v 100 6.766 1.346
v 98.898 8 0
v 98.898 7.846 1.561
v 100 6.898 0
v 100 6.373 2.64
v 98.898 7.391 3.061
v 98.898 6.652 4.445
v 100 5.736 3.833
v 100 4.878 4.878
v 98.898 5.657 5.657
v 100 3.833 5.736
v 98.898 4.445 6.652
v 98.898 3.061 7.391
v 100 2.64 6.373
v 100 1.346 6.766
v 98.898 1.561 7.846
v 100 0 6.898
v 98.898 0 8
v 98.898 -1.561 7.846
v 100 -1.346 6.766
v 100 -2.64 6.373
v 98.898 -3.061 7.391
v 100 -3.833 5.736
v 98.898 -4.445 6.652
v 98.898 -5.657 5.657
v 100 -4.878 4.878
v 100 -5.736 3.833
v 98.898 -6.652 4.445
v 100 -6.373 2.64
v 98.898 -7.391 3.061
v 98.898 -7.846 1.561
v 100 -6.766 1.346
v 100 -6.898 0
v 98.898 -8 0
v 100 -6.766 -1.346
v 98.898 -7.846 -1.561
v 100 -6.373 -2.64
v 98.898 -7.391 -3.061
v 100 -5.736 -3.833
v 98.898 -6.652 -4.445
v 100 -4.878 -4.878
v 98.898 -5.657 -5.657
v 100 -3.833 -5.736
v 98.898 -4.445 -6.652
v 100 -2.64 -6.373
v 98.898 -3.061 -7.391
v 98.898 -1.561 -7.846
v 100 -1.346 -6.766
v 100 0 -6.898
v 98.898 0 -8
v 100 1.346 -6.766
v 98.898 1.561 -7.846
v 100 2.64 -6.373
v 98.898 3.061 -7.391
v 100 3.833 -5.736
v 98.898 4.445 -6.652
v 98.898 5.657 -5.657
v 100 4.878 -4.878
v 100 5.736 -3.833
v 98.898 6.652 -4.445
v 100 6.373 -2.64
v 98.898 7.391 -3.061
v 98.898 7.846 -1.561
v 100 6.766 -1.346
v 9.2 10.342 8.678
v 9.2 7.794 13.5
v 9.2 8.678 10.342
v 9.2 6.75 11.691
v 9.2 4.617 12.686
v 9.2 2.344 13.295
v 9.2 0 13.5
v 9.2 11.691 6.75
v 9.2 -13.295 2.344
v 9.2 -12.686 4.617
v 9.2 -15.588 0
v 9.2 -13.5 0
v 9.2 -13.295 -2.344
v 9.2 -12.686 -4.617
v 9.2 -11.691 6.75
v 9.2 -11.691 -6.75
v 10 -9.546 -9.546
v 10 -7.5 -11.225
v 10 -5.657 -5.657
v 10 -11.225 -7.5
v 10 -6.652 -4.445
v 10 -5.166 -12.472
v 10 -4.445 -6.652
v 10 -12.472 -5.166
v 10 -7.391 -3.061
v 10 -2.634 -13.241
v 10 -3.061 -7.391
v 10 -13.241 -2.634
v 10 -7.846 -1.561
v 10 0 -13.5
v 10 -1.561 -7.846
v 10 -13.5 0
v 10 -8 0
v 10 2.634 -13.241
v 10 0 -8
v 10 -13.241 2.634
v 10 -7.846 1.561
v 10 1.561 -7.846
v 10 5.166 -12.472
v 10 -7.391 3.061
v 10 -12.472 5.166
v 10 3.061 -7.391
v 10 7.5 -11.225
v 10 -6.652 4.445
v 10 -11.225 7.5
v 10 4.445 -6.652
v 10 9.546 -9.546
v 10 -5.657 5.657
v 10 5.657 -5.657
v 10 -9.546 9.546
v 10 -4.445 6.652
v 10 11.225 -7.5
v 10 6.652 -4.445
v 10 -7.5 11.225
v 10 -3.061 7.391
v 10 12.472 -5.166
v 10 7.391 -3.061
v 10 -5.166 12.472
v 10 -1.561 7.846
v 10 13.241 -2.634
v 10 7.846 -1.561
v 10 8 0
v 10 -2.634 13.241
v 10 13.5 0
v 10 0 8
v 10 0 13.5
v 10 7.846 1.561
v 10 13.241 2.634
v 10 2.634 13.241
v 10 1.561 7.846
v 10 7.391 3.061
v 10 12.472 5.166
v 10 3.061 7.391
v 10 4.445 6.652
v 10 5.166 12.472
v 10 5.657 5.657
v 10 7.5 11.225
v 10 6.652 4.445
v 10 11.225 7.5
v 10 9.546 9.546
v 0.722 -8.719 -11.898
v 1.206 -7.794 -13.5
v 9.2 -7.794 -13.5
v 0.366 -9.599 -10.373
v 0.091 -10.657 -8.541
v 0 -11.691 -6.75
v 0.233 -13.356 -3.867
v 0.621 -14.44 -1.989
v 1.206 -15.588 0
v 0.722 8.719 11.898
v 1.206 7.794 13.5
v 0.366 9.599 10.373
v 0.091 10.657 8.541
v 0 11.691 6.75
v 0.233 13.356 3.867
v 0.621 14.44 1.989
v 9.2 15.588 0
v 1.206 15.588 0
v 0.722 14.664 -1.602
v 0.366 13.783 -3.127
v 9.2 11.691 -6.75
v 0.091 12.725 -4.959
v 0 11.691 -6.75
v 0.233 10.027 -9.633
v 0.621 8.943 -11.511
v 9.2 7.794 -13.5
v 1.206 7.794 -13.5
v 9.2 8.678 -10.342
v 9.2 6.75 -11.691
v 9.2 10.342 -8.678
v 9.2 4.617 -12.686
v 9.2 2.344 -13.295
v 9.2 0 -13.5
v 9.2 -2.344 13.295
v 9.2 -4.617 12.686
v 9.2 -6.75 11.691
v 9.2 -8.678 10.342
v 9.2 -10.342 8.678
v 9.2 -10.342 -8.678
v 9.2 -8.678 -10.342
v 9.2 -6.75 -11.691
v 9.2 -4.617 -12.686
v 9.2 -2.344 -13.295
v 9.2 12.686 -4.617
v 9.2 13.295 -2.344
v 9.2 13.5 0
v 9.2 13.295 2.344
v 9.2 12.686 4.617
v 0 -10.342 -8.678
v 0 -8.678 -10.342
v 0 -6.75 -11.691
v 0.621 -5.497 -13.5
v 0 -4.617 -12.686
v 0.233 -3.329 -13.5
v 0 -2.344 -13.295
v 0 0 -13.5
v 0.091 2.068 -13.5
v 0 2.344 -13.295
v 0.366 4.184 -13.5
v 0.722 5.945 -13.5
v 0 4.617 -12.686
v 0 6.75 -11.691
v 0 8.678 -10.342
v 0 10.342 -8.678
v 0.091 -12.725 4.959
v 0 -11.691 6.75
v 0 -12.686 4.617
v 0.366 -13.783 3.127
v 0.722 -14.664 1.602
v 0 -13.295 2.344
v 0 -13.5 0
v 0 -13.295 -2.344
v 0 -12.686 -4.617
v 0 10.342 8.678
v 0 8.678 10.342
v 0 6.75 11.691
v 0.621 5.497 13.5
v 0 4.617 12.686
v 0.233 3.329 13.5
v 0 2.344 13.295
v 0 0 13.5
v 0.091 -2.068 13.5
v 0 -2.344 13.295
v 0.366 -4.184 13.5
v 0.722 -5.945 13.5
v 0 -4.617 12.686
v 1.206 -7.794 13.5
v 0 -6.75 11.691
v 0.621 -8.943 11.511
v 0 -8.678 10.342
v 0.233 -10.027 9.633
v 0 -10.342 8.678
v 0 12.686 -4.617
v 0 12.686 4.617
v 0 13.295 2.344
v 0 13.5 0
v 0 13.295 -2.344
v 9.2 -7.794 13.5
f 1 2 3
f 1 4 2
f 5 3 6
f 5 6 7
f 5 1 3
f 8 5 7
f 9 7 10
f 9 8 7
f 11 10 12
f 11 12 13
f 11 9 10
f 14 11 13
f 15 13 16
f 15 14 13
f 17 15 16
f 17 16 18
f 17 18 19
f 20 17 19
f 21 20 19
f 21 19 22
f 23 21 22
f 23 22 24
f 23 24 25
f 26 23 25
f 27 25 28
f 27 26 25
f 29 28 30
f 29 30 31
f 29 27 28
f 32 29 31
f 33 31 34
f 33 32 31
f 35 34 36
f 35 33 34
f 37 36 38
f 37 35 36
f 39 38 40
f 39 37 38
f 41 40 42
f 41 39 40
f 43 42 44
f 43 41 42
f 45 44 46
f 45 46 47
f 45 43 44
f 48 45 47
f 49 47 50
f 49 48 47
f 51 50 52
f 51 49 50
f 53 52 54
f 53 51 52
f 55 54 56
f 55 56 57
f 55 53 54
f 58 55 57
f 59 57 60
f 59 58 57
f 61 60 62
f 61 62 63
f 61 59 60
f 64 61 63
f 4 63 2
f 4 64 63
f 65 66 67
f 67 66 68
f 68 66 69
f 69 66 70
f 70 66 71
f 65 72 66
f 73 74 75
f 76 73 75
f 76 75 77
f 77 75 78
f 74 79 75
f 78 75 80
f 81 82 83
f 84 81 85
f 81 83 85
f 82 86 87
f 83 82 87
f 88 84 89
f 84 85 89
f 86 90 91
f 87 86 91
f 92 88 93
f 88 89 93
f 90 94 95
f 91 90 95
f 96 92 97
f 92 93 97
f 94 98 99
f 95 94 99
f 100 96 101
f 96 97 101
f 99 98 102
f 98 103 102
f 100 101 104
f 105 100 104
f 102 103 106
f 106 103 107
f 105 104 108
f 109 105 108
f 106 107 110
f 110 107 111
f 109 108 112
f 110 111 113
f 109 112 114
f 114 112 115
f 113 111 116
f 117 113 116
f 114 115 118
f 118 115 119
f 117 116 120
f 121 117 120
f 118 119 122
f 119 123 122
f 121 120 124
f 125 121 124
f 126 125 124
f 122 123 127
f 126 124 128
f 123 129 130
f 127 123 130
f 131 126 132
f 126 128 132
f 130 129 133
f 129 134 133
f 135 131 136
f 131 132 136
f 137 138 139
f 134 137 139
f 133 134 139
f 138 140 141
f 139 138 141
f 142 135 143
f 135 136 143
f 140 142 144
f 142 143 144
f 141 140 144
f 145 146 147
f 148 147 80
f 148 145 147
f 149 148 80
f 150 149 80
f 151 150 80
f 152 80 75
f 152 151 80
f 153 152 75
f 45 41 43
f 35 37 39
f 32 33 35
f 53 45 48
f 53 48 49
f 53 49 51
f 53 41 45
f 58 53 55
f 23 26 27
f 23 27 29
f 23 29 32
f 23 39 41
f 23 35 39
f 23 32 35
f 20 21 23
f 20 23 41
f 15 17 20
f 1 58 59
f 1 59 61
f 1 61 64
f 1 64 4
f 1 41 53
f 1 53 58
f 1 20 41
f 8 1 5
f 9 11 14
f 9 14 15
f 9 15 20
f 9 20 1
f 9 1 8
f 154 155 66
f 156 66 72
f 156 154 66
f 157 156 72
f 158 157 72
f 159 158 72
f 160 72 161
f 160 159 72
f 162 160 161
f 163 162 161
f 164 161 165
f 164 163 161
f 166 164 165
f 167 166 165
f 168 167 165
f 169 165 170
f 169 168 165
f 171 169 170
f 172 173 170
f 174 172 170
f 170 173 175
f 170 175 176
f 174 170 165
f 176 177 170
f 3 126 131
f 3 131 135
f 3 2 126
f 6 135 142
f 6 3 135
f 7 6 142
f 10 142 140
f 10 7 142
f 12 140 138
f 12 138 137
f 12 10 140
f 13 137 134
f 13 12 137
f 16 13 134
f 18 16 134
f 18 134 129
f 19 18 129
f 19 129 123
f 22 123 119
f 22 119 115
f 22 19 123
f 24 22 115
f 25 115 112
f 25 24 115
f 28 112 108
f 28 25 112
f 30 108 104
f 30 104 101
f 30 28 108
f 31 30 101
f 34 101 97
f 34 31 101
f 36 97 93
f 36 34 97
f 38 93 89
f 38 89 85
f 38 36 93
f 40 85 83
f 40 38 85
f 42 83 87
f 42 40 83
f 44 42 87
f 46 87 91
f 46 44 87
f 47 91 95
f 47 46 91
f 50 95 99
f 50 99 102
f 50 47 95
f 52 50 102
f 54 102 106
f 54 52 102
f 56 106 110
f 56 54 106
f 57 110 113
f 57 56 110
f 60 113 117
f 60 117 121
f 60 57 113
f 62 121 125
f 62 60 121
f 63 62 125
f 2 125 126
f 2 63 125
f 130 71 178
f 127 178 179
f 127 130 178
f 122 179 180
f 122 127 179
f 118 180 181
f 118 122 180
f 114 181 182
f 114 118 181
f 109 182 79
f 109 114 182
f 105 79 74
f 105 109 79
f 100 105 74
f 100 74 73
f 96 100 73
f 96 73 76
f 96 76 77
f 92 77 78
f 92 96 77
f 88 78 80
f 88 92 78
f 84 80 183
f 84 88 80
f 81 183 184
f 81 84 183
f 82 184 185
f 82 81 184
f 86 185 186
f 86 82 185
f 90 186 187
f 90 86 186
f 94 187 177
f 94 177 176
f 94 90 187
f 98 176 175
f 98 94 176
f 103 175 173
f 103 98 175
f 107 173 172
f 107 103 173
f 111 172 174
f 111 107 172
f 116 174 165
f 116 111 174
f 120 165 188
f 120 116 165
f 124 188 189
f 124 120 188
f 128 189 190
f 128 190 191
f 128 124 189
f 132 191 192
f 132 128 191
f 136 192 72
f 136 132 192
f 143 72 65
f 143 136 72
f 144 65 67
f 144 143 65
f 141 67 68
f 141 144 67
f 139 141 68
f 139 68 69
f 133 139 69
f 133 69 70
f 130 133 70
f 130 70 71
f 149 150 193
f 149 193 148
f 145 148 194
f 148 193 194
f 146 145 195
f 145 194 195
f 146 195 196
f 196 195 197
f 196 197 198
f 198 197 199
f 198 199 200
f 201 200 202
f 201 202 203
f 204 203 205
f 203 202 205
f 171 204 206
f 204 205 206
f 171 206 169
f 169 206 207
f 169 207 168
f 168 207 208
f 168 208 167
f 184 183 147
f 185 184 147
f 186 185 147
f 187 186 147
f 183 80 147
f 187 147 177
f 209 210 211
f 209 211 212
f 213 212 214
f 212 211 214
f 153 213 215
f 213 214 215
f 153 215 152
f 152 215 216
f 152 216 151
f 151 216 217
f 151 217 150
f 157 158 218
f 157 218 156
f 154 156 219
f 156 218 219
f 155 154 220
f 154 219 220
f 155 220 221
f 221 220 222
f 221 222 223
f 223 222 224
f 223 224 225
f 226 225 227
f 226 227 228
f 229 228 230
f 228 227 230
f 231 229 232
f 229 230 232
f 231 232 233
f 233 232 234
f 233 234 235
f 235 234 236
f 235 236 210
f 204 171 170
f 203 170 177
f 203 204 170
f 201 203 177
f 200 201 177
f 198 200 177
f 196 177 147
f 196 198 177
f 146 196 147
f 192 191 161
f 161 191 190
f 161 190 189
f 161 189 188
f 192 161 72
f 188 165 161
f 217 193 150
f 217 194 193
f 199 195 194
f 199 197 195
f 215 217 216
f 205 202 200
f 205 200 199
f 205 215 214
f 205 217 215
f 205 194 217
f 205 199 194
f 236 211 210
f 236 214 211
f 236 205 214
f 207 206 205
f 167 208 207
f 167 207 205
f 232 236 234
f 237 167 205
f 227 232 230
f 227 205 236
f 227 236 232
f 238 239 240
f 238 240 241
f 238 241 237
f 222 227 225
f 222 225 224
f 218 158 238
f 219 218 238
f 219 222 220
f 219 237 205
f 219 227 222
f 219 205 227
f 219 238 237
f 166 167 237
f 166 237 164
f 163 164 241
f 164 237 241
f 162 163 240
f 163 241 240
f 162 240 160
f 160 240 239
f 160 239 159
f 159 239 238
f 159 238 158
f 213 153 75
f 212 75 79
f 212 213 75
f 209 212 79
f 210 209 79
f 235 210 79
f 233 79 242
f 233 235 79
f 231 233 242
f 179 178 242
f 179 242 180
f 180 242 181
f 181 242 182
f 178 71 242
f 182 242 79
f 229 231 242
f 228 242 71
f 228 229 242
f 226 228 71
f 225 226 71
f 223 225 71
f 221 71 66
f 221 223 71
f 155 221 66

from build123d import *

# Parameters (mm, degrees)
BASEHEAD_DEPTH = 10
SKETCH4_W      = 0.8
SKETCH4_H      = 12.088457268


# Read off the part's stored shape, not the designer's step: HeadChamfer
with BuildPart() as part:
    # Sketch1 → BaseHead (new body)
    with BuildSketch(Plane(origin=(0, 0, 0), x_dir=(0, 0, -1), z_dir=(1, 0, 0))):
        Polygon((13.5, 7.794228634), (13.5, -7.794228634), (0, -15.588457268), (-13.5, -7.794228634), (-13.5, 7.794228634), (0, 15.588457268), align=None)
    extrude(amount=BASEHEAD_DEPTH)

    # HeadChamfer outline → HeadChamfer (revolve, cut)
    with BuildSketch(Plane.YX):
        Polygon((15.58845727, 1.205771367), (13.499999851, -8.6e-08), (15.58845727, -8.6e-08), align=None)
    revolve(axis=Axis((0, 0, 0), (1, 0, 0)), mode=Mode.SUBTRACT)

    # HeadChamfer 2 outline → HeadChamfer 2 (revolve)
    with BuildSketch(Plane.YX):
        Polygon((8, 10), (8, 98.8985), (6.8985, 100), (0, 100), (0, 10), align=None)
    revolve(axis=Axis((0, 0, 0), (1, 0, 0)))

    # Sketch4 → BearingFace (revolve, cut)
    with BuildSketch(Plane.XY, mode=Mode.PRIVATE) as bearingface_sk:
        with Locations((9.6, 19.544228634)):
            Rectangle(SKETCH4_W, SKETCH4_H)
    revolve(bearingface_sk.sketch.rotate(Axis((0, 0, 0), (1, 0, 0)), 90), axis=Axis((0, 0, 0), (1, 0, 0)), mode=Mode.SUBTRACT)


solid = part.part
